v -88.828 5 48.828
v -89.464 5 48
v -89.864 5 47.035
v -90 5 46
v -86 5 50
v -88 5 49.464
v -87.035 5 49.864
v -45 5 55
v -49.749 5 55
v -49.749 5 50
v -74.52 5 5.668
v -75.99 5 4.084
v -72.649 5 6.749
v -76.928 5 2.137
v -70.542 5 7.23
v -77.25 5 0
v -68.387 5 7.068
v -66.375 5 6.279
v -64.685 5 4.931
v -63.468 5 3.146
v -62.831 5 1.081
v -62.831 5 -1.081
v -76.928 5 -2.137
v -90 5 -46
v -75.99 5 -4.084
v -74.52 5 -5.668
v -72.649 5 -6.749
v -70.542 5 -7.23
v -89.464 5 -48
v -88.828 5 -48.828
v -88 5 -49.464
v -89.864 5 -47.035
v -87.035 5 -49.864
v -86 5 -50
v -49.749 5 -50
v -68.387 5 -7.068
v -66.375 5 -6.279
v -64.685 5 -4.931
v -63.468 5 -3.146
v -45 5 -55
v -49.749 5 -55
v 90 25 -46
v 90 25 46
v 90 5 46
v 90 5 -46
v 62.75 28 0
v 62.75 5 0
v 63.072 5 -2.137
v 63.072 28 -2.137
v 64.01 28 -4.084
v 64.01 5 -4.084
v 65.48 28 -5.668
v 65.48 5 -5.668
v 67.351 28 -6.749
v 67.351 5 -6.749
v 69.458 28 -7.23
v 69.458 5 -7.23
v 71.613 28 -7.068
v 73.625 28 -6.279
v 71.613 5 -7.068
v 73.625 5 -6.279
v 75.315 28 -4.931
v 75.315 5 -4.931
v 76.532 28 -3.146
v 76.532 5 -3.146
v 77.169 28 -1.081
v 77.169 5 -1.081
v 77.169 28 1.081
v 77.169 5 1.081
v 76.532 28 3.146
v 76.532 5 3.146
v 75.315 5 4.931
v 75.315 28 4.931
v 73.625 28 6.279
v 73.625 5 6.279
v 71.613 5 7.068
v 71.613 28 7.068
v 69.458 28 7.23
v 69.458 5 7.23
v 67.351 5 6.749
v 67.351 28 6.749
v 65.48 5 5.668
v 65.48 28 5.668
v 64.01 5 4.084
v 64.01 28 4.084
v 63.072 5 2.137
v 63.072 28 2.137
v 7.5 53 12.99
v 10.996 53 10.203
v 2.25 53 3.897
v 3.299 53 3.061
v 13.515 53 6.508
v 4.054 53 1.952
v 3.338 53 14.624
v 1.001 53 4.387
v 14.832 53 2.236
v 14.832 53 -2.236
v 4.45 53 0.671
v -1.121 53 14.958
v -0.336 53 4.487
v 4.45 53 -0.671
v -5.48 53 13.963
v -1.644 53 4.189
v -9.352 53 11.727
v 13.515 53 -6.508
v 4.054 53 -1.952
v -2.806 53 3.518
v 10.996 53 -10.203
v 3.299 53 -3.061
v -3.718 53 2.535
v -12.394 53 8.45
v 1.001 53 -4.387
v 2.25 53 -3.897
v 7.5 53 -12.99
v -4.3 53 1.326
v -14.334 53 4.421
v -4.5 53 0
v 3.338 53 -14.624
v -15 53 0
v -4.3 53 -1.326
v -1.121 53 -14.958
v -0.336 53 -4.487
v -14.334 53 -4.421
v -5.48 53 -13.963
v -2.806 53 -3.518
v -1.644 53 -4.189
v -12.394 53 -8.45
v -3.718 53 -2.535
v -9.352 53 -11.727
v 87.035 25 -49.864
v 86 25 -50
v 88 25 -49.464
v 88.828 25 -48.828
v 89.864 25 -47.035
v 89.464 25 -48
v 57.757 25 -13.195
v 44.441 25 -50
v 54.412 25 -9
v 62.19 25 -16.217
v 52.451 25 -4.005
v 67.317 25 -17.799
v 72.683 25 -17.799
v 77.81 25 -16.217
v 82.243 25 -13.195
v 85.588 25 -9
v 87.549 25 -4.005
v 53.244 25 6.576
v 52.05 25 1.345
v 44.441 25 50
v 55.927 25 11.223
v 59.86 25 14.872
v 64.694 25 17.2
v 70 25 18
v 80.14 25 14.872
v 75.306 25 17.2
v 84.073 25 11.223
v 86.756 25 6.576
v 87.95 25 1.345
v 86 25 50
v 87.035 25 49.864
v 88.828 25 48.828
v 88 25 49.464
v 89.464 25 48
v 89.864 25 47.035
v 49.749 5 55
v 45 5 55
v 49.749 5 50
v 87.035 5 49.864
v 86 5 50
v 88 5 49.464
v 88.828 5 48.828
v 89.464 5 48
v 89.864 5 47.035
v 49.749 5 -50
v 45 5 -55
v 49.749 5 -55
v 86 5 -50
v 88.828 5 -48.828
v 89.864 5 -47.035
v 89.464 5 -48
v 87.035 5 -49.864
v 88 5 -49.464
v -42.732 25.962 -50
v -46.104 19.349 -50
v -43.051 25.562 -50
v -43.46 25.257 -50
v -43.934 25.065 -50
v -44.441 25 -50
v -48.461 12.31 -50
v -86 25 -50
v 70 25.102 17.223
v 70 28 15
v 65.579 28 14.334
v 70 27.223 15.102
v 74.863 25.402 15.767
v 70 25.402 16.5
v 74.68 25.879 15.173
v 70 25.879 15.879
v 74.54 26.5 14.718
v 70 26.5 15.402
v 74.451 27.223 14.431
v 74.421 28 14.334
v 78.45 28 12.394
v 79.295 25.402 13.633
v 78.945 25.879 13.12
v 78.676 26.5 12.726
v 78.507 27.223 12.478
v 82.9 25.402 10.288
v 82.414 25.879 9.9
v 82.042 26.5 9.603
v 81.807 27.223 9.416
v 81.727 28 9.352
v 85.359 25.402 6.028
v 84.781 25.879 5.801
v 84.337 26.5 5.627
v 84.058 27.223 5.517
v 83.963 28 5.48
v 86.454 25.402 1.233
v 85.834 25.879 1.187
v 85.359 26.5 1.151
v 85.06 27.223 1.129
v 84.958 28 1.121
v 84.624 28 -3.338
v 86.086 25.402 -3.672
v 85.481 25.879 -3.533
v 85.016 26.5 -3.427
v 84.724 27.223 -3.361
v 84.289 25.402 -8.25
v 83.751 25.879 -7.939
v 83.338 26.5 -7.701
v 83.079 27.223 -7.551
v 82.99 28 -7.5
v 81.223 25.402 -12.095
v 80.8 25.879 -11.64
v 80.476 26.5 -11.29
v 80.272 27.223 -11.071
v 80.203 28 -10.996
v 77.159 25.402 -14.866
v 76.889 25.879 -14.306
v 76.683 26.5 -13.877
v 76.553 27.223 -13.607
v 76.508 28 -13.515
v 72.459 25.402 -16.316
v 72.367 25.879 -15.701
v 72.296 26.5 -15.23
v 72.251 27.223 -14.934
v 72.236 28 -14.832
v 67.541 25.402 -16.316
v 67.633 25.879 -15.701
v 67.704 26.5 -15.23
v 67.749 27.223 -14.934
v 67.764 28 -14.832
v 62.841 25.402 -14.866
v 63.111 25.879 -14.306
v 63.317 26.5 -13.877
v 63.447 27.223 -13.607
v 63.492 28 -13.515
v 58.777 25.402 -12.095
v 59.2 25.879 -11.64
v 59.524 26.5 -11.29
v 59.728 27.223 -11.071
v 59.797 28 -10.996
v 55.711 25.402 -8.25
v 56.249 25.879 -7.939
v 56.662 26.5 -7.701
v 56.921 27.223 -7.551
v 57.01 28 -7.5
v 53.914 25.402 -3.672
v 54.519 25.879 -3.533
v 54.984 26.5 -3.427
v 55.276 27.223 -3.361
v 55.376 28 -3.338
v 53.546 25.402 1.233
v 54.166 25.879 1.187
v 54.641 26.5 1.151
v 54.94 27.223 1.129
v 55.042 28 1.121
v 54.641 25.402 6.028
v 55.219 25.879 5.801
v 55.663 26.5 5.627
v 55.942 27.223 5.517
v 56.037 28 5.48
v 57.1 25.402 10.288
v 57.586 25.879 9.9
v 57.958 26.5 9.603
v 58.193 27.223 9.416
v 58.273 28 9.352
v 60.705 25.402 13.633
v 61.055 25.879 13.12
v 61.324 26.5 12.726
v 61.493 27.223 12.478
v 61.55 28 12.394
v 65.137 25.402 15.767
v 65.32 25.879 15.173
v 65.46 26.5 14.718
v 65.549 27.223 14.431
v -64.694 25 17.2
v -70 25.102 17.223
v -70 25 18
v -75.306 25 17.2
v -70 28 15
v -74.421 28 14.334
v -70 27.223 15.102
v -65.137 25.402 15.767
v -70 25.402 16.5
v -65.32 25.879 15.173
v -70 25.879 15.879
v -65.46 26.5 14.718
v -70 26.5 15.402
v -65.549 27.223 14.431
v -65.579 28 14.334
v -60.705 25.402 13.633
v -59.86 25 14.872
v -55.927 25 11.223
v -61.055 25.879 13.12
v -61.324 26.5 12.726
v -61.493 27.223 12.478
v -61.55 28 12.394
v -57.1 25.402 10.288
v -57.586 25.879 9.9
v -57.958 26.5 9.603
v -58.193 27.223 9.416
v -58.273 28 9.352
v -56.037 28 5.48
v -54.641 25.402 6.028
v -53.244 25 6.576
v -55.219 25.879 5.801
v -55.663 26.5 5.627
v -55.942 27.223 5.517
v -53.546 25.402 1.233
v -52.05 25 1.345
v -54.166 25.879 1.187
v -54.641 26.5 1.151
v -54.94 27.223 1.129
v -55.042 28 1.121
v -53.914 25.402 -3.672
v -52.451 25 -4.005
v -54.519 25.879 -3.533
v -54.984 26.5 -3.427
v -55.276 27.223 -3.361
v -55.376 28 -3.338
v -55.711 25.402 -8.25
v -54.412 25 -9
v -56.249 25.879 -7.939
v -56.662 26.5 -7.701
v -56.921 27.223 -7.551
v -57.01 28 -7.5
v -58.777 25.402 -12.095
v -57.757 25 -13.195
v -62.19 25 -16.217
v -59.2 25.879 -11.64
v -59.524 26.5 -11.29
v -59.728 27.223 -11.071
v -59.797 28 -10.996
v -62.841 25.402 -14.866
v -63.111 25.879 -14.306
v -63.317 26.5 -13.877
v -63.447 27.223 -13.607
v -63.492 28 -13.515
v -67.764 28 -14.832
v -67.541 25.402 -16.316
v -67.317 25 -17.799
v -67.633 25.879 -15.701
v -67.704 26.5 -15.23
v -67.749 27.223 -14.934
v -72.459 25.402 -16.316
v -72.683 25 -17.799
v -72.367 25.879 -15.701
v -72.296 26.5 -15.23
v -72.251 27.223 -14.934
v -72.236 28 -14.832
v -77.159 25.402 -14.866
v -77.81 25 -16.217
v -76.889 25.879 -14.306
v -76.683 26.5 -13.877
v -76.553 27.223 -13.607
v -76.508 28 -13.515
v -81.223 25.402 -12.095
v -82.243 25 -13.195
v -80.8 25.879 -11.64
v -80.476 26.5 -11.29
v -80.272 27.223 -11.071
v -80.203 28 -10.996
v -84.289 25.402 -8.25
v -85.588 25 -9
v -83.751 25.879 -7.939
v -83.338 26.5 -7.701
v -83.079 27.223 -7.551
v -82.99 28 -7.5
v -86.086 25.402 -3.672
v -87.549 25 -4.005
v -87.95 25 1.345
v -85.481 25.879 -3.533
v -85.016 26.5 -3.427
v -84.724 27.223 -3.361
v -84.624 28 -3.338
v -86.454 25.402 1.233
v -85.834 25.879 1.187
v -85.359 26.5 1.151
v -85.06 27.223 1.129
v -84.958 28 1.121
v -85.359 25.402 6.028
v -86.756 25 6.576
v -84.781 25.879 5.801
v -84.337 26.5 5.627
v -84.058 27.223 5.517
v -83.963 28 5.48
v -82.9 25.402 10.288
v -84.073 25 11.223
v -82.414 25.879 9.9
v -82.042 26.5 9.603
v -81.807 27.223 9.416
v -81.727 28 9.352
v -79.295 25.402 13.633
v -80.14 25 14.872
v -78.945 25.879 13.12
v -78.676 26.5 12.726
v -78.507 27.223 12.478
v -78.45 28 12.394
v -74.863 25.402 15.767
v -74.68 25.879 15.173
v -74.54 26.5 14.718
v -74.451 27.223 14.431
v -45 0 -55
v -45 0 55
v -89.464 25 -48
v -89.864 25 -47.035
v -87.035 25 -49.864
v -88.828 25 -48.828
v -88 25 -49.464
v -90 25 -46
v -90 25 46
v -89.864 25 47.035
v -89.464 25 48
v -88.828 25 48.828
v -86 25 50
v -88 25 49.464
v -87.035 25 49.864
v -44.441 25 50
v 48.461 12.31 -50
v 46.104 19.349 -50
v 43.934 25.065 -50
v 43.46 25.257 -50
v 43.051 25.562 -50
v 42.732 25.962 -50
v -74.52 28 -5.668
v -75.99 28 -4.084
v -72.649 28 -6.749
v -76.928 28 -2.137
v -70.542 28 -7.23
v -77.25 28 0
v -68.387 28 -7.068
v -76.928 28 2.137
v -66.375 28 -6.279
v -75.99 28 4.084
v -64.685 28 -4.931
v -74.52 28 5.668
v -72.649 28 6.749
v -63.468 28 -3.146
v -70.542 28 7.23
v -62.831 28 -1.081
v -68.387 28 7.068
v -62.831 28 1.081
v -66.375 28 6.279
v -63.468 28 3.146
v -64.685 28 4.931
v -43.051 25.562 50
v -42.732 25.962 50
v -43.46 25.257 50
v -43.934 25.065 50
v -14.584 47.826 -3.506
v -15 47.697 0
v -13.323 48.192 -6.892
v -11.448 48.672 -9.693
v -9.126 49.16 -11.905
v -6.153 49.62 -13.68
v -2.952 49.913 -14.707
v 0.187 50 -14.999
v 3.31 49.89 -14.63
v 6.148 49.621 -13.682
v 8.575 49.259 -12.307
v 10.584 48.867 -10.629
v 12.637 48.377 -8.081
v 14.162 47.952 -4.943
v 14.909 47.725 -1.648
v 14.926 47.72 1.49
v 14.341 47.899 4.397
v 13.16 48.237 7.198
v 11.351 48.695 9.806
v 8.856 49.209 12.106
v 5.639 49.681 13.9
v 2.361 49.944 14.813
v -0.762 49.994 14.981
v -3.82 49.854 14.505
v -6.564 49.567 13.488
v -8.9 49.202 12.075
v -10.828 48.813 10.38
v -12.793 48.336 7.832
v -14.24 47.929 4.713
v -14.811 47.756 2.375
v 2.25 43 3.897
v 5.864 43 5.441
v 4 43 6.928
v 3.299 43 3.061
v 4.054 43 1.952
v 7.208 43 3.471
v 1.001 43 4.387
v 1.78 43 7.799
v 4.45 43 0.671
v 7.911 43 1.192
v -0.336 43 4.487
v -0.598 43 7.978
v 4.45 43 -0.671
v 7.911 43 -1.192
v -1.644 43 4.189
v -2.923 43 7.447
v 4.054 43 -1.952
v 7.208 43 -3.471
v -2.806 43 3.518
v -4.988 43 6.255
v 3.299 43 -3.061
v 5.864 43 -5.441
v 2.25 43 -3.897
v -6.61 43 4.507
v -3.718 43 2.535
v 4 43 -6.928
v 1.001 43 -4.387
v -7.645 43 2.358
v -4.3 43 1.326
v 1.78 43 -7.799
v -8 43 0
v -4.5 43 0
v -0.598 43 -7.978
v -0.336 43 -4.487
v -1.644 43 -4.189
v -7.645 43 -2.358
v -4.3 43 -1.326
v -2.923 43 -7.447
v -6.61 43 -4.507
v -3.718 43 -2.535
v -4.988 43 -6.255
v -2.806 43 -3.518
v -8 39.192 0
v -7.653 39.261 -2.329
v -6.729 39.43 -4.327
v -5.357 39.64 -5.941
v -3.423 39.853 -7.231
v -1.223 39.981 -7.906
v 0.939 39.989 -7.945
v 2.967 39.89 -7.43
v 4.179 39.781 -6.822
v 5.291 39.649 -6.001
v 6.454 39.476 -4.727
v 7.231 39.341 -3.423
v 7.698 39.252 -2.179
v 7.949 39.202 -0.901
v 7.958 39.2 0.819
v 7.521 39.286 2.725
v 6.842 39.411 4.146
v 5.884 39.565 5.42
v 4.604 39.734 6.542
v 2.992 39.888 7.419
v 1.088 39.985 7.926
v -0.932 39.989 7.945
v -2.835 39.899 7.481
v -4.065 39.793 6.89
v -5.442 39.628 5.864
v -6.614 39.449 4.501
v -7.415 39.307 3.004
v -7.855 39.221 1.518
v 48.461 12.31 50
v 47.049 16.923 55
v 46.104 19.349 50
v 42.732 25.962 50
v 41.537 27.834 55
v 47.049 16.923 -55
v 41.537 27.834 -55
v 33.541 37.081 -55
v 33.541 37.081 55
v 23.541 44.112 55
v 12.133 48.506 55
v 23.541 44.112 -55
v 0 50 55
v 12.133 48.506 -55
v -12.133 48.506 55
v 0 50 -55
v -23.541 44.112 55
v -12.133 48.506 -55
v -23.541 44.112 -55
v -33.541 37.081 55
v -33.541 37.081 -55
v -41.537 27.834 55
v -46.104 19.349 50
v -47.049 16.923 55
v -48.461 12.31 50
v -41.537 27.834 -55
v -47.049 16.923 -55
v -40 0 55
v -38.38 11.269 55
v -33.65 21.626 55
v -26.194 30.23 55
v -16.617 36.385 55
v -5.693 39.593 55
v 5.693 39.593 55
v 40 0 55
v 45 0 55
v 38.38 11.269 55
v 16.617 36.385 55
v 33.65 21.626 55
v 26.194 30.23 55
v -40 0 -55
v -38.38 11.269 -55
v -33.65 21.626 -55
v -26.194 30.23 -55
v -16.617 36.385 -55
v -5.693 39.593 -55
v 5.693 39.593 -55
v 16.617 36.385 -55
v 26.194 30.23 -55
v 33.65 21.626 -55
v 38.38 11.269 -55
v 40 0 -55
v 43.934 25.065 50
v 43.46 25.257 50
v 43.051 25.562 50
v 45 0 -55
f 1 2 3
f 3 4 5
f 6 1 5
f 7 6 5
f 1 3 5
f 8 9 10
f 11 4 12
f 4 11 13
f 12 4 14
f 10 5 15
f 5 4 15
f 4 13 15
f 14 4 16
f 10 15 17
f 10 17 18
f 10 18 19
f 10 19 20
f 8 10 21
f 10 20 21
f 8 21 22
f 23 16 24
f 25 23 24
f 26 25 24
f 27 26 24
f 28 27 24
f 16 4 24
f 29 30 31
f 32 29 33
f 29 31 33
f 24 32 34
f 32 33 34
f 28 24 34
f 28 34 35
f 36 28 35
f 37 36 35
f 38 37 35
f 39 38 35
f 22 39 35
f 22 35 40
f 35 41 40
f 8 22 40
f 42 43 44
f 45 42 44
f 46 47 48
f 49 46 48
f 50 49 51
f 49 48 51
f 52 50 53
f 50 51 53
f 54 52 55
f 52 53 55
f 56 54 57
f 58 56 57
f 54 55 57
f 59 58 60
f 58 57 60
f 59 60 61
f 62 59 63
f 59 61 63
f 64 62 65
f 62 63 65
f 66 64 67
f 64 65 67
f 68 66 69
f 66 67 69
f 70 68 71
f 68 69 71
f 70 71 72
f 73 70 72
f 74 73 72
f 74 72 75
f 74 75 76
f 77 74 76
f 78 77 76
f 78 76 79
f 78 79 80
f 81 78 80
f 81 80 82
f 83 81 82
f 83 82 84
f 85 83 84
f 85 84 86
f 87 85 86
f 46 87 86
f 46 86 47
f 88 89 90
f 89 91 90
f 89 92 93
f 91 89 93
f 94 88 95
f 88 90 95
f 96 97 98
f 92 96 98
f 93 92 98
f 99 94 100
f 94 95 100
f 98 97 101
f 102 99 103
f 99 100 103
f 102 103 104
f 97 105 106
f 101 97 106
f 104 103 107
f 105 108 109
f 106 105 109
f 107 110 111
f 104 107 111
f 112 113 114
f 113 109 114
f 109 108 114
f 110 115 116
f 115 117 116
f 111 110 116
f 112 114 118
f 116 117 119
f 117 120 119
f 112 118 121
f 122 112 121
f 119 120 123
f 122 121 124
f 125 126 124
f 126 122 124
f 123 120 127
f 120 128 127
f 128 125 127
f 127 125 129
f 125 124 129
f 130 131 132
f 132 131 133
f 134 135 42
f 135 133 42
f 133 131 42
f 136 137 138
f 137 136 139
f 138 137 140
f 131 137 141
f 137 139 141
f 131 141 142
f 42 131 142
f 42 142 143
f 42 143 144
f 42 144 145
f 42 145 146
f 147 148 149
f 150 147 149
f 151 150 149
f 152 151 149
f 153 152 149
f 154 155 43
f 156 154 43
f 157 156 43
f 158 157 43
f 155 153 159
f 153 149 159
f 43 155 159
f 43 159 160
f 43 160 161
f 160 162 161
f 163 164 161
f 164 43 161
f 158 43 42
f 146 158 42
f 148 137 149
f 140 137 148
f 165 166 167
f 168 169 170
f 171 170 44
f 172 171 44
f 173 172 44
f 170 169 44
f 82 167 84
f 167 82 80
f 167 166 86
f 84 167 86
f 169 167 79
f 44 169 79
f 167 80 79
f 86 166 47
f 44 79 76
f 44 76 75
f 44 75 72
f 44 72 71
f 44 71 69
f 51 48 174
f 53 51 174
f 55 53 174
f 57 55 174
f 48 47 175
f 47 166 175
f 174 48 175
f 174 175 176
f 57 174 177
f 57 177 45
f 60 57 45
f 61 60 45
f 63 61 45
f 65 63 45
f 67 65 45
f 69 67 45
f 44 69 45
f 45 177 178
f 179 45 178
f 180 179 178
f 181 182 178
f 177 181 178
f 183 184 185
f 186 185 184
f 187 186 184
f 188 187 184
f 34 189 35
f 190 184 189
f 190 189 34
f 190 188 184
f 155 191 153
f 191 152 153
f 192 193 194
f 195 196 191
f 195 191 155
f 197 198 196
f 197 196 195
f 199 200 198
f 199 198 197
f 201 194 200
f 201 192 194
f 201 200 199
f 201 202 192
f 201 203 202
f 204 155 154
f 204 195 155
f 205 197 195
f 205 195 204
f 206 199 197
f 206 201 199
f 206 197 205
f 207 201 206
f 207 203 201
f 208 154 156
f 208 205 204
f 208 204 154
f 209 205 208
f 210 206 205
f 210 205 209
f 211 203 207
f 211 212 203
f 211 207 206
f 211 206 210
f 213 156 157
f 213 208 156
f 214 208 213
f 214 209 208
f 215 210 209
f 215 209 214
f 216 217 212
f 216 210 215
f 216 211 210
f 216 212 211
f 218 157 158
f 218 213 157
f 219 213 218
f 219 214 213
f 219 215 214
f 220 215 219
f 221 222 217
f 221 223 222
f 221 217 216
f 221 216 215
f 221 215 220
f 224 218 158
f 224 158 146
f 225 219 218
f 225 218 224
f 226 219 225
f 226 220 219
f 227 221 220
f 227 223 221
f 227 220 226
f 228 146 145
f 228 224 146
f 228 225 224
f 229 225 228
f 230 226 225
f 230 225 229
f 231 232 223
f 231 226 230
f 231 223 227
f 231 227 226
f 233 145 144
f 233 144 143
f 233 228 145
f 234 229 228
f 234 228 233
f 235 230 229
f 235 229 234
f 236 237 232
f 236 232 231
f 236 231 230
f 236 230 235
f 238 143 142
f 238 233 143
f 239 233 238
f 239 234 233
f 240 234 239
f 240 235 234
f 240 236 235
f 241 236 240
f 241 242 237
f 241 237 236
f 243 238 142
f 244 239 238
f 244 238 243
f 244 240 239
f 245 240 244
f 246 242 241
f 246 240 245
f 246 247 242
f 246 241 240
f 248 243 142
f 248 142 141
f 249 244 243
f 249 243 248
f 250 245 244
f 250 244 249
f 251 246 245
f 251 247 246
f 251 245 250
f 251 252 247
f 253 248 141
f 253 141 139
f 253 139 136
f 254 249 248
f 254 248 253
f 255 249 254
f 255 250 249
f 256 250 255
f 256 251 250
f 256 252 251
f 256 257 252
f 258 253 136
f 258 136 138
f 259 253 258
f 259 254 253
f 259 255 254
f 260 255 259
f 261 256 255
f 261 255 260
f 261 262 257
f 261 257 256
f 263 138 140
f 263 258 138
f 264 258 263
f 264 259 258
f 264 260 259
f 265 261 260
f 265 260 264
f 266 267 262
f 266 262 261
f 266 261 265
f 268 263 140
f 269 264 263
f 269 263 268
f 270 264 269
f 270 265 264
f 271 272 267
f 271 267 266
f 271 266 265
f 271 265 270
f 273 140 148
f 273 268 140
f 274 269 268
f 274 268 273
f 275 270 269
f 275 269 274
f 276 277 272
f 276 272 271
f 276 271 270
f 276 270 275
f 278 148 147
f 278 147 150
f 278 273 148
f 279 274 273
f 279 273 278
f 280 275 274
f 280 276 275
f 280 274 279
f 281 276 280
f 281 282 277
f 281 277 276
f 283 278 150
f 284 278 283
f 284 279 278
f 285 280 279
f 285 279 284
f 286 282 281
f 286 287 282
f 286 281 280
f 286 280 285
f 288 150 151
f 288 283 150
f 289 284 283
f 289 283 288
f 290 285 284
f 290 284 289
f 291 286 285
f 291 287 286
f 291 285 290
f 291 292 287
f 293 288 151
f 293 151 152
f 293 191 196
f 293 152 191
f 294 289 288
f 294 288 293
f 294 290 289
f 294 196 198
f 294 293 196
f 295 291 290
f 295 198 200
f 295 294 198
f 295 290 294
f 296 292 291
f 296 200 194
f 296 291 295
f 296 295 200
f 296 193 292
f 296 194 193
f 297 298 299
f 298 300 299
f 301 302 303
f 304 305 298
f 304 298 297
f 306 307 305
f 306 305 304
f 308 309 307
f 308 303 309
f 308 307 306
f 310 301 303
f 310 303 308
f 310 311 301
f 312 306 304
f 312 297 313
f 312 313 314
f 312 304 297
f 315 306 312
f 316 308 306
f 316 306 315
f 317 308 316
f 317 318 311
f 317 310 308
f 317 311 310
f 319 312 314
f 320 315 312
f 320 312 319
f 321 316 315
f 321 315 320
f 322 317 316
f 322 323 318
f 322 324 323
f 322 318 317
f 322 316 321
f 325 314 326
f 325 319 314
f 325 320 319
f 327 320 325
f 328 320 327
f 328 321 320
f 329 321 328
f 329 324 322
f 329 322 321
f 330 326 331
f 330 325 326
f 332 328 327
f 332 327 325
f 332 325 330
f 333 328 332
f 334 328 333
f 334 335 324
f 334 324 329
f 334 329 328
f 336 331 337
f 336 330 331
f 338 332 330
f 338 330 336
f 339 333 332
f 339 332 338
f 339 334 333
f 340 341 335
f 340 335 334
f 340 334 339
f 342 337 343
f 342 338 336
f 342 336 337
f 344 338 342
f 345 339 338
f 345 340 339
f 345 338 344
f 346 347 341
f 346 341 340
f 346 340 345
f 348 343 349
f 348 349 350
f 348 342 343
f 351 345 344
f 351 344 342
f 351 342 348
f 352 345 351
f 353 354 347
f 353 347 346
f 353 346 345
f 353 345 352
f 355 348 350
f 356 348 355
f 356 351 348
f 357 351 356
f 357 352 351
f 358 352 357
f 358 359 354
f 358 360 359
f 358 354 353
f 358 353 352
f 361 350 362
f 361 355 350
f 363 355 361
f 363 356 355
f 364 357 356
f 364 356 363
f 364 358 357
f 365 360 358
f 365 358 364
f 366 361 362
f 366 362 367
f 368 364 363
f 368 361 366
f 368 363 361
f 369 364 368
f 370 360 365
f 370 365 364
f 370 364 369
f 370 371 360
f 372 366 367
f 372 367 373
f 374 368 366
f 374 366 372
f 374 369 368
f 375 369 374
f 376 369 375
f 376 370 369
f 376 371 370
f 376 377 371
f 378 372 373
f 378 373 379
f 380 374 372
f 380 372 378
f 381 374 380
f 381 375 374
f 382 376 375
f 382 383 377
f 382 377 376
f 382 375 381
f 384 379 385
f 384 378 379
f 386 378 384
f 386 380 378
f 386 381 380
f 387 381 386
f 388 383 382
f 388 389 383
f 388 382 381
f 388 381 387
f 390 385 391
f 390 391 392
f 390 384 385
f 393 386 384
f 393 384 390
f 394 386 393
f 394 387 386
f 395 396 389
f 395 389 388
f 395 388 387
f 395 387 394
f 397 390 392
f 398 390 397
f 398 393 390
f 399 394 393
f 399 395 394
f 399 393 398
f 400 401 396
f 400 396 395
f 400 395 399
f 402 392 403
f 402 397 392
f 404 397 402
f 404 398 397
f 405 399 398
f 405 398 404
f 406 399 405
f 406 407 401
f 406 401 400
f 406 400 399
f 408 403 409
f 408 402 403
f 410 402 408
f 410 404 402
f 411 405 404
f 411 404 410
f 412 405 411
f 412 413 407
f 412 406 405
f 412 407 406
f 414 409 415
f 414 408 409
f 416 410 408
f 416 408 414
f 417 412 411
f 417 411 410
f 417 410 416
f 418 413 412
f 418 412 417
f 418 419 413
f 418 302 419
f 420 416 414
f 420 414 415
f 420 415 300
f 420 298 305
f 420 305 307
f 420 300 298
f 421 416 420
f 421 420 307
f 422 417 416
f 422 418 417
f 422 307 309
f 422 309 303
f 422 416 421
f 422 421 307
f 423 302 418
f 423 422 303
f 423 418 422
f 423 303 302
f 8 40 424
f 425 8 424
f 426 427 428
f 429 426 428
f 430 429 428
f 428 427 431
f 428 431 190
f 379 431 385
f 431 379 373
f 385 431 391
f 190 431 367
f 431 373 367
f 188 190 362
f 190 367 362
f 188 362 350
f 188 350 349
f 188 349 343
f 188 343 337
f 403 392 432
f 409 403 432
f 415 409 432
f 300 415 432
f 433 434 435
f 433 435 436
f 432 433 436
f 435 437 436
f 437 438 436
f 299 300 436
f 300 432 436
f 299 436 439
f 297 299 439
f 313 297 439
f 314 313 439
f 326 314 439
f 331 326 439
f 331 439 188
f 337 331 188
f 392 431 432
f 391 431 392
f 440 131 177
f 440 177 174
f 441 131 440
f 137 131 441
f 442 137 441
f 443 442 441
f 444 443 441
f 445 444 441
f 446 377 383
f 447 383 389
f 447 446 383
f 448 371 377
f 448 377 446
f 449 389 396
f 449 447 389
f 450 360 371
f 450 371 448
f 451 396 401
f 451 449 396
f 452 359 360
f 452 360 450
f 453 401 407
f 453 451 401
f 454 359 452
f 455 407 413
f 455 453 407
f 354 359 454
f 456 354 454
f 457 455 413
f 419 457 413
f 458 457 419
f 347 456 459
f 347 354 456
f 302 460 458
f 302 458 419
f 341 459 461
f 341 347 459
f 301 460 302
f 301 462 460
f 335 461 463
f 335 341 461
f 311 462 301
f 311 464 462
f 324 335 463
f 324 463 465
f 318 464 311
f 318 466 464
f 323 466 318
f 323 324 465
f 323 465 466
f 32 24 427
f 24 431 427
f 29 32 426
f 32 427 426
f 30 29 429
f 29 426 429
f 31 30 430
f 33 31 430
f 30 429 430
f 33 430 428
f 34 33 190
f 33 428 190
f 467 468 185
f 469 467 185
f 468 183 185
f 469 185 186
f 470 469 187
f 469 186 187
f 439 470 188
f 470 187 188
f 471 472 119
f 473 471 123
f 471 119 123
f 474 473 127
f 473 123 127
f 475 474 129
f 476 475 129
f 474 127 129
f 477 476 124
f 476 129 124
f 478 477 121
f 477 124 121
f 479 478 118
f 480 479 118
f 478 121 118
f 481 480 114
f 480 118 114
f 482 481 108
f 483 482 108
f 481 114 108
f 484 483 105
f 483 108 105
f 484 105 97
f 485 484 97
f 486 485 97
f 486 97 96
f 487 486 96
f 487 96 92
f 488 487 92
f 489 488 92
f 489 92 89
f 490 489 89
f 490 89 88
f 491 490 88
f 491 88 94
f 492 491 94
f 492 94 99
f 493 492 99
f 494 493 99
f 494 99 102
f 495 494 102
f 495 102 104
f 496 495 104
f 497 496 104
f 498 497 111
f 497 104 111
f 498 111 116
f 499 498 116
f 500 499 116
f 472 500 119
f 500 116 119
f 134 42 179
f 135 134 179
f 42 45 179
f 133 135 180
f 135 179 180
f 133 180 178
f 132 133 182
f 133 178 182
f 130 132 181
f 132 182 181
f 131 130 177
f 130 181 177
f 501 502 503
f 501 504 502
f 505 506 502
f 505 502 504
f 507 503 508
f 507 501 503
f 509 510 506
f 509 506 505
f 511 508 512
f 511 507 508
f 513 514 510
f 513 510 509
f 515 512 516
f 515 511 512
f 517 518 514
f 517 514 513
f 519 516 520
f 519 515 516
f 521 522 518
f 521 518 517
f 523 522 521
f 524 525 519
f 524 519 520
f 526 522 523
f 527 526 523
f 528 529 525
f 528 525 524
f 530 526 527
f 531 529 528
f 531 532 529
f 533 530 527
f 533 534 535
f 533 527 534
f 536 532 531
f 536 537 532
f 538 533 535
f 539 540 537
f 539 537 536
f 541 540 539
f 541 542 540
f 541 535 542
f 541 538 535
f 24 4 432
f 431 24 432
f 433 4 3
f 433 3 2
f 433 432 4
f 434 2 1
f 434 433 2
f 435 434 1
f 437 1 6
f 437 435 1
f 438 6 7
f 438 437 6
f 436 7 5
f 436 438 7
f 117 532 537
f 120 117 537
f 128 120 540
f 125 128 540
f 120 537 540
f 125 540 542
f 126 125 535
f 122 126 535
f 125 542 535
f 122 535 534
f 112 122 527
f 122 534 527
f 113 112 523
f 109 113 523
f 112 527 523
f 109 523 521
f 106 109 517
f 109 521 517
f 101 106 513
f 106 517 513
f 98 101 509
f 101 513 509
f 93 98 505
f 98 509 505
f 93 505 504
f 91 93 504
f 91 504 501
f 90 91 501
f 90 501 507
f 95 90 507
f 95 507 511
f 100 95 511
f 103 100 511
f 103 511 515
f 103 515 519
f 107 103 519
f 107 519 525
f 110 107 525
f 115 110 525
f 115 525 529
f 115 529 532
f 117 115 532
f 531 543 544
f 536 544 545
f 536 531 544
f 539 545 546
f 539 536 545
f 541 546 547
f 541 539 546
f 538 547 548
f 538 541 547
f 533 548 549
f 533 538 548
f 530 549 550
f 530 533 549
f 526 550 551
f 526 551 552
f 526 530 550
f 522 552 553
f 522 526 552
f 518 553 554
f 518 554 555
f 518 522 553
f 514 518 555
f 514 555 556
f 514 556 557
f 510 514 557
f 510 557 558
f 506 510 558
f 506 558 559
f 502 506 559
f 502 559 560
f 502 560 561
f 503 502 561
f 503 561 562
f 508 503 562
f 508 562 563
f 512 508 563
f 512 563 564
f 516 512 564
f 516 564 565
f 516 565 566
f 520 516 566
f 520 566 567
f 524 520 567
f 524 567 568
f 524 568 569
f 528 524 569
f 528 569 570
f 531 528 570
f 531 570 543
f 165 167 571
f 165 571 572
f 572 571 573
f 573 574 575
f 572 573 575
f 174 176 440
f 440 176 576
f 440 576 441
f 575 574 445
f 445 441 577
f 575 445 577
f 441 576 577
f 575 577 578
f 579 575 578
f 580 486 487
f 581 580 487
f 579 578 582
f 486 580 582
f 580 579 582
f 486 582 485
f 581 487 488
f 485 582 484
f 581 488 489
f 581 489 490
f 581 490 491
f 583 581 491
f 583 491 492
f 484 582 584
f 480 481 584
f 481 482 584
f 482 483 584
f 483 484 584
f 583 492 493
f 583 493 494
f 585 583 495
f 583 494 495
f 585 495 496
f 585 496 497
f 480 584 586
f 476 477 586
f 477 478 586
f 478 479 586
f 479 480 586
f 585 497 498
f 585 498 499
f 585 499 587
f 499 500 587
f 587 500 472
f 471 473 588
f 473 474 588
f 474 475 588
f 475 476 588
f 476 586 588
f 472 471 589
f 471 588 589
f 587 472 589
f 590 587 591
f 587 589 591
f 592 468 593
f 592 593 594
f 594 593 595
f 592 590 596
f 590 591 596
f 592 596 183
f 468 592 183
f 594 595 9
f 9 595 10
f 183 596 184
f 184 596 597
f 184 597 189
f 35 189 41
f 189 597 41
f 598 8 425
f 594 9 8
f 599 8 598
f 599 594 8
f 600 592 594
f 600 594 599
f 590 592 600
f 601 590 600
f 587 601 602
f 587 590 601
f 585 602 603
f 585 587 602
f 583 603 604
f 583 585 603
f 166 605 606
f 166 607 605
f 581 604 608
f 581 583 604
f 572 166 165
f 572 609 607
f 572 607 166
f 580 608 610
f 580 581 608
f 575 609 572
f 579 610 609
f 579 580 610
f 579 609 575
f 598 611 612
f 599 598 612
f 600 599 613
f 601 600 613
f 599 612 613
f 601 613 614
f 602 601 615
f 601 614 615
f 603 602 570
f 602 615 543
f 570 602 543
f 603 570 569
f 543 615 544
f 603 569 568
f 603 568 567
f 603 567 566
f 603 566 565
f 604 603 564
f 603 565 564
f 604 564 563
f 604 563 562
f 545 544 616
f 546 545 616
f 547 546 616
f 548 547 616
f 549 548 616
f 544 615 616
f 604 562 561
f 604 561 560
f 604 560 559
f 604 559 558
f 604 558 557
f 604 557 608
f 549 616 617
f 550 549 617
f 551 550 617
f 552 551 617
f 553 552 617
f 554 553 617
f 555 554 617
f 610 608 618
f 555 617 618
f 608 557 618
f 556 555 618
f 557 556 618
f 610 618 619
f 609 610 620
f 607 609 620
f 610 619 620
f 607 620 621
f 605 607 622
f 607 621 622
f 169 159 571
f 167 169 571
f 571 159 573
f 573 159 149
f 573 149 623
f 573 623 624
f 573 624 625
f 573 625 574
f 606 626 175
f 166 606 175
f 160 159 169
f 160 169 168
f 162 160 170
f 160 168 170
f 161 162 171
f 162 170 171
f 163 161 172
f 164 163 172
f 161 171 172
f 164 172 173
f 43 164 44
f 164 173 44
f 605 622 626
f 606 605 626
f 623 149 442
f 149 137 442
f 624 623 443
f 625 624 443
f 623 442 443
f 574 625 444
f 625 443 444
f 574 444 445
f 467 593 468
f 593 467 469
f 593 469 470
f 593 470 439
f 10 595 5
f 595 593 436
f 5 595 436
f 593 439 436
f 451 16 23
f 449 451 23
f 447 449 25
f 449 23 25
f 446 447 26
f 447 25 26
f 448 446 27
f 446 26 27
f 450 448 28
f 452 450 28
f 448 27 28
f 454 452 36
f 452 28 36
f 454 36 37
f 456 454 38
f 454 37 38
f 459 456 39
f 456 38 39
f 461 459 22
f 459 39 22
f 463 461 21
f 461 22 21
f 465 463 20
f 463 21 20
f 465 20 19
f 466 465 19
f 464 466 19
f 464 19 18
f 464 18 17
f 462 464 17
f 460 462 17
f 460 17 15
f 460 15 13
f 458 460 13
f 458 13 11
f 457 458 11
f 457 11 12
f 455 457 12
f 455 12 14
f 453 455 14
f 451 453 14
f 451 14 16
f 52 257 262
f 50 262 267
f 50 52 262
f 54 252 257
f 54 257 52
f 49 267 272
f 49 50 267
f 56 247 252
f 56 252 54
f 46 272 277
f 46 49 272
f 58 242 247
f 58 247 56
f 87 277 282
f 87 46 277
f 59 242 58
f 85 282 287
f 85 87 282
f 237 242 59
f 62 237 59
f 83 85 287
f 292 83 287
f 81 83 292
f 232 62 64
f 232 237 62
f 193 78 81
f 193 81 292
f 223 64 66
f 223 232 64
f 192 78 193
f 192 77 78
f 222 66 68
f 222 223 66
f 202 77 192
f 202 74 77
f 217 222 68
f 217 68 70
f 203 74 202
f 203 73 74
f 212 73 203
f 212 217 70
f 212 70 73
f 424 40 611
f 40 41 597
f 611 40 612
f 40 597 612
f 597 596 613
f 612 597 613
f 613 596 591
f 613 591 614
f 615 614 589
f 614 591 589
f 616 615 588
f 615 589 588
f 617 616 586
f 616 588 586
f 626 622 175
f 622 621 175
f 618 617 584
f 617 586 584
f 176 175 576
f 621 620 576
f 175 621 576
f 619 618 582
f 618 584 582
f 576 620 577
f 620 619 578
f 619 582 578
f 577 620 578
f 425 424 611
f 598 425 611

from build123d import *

# Parameters (mm, degrees)
BOSS_EXTRUDE1_DEPTH      = 50
BOSS_EXTRUDE2_START      = 5
BOSS_EXTRUDE2_DEPTH      = 5
SKETCH3_R                = 15
BOSS_EXTRUDE3_DEPTH      = 3
FILLET1_R                = 3
M16X1_5_TAPPED_HOLE1_D   = 14.5
BOSS_EXTRUDE6_REACH      = 120.042
BOSS_EXTRUDE6_END_RADIUS = 50
SKETCH11_R               = 15
M10X1_0_TAPPED_HOLE1_D   = 9
SKETCH15_R               = 8
CUT_EXTRUDE1_DEPTH       = 114.903467988
FILLET2_R                = 2
FILLET3_R                = 4


with BuildPart() as part:
    # Sketch1 → Boss-Extrude1 (new, symmetric)
    with BuildSketch(Plane.XY):
        with BuildLine():
            Line((-40, 0), (-45, 0))
            Line((-45, 0), (-45, 5))
            Line((-45, 5), (-90, 5))
            Line((-90, 5), (-90, 25))
            Line((-90, 25), (-43.301270189, 25))
            ThreePointArc((-43.301270189, 25), (0, 50), (43.301270189, 25))
            Line((43.301270189, 25), (90, 25))
            Line((90, 25), (90, 5))
            Line((90, 5), (45, 5))
            Line((45, 5), (45, 0))
            Line((45, 0), (40, 0))
            ThreePointArc((40, 0), (0, 40), (-40, 0))
        make_face()
    extrude(amount=BOSS_EXTRUDE1_DEPTH, both=True)

    # Sketch2 → Boss-Extrude2 (add)
    with BuildSketch(Plane.XY.offset(50).offset(BOSS_EXTRUDE2_START)):
        with BuildLine():
            Line((40, 0), (45, 0))
            Line((45, 0), (45, 5))
            Line((45, 5), (49.749371855, 5))
            ThreePointArc((49.749371855, 5), (0, 50), (-49.749371855, 5))
            Line((-49.749371855, 5), (-45, 5))
            Line((-45, 5), (-45, 0))
            Line((-45, 0), (-40, 0))
            ThreePointArc((-40, 0), (0, 40), (40, 0))
        make_face()
    boss_extrude2 = extrude(amount=-BOSS_EXTRUDE2_DEPTH)

    # Mirror1: Boss-Extrude2 across plane
    add(boss_extrude2.mirror(Plane.XY))

    # Sketch3 → Boss-Extrude3 (add)
    with BuildSketch(Plane(origin=(0, 25, 0), x_dir=(1, 0, 0), z_dir=(0, 1, 0))):
        with Locations(Location((-70, 0, 0), (0, 0, 270))):
            Circle(SKETCH3_R)
        with Locations(Location((70, 0, 0), (0, 0, 270))):
            Circle(SKETCH3_R)
    extrude(amount=BOSS_EXTRUDE3_DEPTH)

    # Fillet1
    fillet1_edges = [part.edges().sort_by_distance(p)[0] for p in [
        (-70, 25, -15),
        (70, 25, -15),
    ]]
    fillet(fillet1_edges, radius=FILLET1_R - 0.0001)  # a hair under: the kernel refuses the full size

    # M16x1.5 Tapped Hole1 (through all)
    with Locations(Plane(origin=(0, 28, 0), x_dir=(1, 0, 0), z_dir=(0, 1, 0))):
        with Locations((-70, 0), (70, 0)):
            Hole(M16X1_5_TAPPED_HOLE1_D / 2)

    # Boss-Extrude6: up to this cylinder (the profile starts outside it)
    boss_extrude6_end = Plane(origin=(0, 0, 0), z_dir=(0, 0, 1)) * Cylinder(BOSS_EXTRUDE6_END_RADIUS, 341.084, mode=Mode.PRIVATE)
    # Sketch11 → Boss-Extrude6 (add, up to the surface)
    with BuildSketch(Plane(origin=(0, 53, 0), x_dir=(-1, 0, 0), z_dir=(0, -1, 0)), mode=Mode.PRIVATE) as boss_extrude6_sk1:
        Circle(SKETCH11_R)
    boss_extrude6_tool1 = extrude(boss_extrude6_sk1.sketch, amount=BOSS_EXTRUDE6_REACH, mode=Mode.PRIVATE) - boss_extrude6_end
    add(boss_extrude6_tool1.solids().sort_by_distance((0, 53, 0))[0])

    # M10x1.0 Tapped Hole1 (through all)
    with Locations(Plane(origin=(0, 53, 0), x_dir=(1, 0, 0), z_dir=(0, 1, 0))):
        with Locations((0, 0)):
            Hole(M10X1_0_TAPPED_HOLE1_D / 2)

    # Sketch15 → Cut-Extrude1 (cut, through all)
    with BuildSketch(Plane(origin=(0, 43, 0), x_dir=(-1, 0, 0), z_dir=(0, -1, 0))):
        Circle(SKETCH15_R)
    extrude(amount=CUT_EXTRUDE1_DEPTH, mode=Mode.SUBTRACT)

    # Fillet2
    fillet2_edges = [part.edges().sort_by_distance(p)[0] for p in [
        (-43.301270189, 25, 0),
        (43.301270189, 25, 0),
    ]]
    fillet(fillet2_edges, radius=FILLET2_R)

    # Fillet3
    fillet3_edges = [part.edges().sort_by_distance(p)[0] for p in [
        (-90, 15, 50),
        (90, 15, 50),
        (90, 15, -50),
        (-90, 15, -50),
    ]]
    fillet(fillet3_edges, radius=FILLET3_R)


solid = part.part
